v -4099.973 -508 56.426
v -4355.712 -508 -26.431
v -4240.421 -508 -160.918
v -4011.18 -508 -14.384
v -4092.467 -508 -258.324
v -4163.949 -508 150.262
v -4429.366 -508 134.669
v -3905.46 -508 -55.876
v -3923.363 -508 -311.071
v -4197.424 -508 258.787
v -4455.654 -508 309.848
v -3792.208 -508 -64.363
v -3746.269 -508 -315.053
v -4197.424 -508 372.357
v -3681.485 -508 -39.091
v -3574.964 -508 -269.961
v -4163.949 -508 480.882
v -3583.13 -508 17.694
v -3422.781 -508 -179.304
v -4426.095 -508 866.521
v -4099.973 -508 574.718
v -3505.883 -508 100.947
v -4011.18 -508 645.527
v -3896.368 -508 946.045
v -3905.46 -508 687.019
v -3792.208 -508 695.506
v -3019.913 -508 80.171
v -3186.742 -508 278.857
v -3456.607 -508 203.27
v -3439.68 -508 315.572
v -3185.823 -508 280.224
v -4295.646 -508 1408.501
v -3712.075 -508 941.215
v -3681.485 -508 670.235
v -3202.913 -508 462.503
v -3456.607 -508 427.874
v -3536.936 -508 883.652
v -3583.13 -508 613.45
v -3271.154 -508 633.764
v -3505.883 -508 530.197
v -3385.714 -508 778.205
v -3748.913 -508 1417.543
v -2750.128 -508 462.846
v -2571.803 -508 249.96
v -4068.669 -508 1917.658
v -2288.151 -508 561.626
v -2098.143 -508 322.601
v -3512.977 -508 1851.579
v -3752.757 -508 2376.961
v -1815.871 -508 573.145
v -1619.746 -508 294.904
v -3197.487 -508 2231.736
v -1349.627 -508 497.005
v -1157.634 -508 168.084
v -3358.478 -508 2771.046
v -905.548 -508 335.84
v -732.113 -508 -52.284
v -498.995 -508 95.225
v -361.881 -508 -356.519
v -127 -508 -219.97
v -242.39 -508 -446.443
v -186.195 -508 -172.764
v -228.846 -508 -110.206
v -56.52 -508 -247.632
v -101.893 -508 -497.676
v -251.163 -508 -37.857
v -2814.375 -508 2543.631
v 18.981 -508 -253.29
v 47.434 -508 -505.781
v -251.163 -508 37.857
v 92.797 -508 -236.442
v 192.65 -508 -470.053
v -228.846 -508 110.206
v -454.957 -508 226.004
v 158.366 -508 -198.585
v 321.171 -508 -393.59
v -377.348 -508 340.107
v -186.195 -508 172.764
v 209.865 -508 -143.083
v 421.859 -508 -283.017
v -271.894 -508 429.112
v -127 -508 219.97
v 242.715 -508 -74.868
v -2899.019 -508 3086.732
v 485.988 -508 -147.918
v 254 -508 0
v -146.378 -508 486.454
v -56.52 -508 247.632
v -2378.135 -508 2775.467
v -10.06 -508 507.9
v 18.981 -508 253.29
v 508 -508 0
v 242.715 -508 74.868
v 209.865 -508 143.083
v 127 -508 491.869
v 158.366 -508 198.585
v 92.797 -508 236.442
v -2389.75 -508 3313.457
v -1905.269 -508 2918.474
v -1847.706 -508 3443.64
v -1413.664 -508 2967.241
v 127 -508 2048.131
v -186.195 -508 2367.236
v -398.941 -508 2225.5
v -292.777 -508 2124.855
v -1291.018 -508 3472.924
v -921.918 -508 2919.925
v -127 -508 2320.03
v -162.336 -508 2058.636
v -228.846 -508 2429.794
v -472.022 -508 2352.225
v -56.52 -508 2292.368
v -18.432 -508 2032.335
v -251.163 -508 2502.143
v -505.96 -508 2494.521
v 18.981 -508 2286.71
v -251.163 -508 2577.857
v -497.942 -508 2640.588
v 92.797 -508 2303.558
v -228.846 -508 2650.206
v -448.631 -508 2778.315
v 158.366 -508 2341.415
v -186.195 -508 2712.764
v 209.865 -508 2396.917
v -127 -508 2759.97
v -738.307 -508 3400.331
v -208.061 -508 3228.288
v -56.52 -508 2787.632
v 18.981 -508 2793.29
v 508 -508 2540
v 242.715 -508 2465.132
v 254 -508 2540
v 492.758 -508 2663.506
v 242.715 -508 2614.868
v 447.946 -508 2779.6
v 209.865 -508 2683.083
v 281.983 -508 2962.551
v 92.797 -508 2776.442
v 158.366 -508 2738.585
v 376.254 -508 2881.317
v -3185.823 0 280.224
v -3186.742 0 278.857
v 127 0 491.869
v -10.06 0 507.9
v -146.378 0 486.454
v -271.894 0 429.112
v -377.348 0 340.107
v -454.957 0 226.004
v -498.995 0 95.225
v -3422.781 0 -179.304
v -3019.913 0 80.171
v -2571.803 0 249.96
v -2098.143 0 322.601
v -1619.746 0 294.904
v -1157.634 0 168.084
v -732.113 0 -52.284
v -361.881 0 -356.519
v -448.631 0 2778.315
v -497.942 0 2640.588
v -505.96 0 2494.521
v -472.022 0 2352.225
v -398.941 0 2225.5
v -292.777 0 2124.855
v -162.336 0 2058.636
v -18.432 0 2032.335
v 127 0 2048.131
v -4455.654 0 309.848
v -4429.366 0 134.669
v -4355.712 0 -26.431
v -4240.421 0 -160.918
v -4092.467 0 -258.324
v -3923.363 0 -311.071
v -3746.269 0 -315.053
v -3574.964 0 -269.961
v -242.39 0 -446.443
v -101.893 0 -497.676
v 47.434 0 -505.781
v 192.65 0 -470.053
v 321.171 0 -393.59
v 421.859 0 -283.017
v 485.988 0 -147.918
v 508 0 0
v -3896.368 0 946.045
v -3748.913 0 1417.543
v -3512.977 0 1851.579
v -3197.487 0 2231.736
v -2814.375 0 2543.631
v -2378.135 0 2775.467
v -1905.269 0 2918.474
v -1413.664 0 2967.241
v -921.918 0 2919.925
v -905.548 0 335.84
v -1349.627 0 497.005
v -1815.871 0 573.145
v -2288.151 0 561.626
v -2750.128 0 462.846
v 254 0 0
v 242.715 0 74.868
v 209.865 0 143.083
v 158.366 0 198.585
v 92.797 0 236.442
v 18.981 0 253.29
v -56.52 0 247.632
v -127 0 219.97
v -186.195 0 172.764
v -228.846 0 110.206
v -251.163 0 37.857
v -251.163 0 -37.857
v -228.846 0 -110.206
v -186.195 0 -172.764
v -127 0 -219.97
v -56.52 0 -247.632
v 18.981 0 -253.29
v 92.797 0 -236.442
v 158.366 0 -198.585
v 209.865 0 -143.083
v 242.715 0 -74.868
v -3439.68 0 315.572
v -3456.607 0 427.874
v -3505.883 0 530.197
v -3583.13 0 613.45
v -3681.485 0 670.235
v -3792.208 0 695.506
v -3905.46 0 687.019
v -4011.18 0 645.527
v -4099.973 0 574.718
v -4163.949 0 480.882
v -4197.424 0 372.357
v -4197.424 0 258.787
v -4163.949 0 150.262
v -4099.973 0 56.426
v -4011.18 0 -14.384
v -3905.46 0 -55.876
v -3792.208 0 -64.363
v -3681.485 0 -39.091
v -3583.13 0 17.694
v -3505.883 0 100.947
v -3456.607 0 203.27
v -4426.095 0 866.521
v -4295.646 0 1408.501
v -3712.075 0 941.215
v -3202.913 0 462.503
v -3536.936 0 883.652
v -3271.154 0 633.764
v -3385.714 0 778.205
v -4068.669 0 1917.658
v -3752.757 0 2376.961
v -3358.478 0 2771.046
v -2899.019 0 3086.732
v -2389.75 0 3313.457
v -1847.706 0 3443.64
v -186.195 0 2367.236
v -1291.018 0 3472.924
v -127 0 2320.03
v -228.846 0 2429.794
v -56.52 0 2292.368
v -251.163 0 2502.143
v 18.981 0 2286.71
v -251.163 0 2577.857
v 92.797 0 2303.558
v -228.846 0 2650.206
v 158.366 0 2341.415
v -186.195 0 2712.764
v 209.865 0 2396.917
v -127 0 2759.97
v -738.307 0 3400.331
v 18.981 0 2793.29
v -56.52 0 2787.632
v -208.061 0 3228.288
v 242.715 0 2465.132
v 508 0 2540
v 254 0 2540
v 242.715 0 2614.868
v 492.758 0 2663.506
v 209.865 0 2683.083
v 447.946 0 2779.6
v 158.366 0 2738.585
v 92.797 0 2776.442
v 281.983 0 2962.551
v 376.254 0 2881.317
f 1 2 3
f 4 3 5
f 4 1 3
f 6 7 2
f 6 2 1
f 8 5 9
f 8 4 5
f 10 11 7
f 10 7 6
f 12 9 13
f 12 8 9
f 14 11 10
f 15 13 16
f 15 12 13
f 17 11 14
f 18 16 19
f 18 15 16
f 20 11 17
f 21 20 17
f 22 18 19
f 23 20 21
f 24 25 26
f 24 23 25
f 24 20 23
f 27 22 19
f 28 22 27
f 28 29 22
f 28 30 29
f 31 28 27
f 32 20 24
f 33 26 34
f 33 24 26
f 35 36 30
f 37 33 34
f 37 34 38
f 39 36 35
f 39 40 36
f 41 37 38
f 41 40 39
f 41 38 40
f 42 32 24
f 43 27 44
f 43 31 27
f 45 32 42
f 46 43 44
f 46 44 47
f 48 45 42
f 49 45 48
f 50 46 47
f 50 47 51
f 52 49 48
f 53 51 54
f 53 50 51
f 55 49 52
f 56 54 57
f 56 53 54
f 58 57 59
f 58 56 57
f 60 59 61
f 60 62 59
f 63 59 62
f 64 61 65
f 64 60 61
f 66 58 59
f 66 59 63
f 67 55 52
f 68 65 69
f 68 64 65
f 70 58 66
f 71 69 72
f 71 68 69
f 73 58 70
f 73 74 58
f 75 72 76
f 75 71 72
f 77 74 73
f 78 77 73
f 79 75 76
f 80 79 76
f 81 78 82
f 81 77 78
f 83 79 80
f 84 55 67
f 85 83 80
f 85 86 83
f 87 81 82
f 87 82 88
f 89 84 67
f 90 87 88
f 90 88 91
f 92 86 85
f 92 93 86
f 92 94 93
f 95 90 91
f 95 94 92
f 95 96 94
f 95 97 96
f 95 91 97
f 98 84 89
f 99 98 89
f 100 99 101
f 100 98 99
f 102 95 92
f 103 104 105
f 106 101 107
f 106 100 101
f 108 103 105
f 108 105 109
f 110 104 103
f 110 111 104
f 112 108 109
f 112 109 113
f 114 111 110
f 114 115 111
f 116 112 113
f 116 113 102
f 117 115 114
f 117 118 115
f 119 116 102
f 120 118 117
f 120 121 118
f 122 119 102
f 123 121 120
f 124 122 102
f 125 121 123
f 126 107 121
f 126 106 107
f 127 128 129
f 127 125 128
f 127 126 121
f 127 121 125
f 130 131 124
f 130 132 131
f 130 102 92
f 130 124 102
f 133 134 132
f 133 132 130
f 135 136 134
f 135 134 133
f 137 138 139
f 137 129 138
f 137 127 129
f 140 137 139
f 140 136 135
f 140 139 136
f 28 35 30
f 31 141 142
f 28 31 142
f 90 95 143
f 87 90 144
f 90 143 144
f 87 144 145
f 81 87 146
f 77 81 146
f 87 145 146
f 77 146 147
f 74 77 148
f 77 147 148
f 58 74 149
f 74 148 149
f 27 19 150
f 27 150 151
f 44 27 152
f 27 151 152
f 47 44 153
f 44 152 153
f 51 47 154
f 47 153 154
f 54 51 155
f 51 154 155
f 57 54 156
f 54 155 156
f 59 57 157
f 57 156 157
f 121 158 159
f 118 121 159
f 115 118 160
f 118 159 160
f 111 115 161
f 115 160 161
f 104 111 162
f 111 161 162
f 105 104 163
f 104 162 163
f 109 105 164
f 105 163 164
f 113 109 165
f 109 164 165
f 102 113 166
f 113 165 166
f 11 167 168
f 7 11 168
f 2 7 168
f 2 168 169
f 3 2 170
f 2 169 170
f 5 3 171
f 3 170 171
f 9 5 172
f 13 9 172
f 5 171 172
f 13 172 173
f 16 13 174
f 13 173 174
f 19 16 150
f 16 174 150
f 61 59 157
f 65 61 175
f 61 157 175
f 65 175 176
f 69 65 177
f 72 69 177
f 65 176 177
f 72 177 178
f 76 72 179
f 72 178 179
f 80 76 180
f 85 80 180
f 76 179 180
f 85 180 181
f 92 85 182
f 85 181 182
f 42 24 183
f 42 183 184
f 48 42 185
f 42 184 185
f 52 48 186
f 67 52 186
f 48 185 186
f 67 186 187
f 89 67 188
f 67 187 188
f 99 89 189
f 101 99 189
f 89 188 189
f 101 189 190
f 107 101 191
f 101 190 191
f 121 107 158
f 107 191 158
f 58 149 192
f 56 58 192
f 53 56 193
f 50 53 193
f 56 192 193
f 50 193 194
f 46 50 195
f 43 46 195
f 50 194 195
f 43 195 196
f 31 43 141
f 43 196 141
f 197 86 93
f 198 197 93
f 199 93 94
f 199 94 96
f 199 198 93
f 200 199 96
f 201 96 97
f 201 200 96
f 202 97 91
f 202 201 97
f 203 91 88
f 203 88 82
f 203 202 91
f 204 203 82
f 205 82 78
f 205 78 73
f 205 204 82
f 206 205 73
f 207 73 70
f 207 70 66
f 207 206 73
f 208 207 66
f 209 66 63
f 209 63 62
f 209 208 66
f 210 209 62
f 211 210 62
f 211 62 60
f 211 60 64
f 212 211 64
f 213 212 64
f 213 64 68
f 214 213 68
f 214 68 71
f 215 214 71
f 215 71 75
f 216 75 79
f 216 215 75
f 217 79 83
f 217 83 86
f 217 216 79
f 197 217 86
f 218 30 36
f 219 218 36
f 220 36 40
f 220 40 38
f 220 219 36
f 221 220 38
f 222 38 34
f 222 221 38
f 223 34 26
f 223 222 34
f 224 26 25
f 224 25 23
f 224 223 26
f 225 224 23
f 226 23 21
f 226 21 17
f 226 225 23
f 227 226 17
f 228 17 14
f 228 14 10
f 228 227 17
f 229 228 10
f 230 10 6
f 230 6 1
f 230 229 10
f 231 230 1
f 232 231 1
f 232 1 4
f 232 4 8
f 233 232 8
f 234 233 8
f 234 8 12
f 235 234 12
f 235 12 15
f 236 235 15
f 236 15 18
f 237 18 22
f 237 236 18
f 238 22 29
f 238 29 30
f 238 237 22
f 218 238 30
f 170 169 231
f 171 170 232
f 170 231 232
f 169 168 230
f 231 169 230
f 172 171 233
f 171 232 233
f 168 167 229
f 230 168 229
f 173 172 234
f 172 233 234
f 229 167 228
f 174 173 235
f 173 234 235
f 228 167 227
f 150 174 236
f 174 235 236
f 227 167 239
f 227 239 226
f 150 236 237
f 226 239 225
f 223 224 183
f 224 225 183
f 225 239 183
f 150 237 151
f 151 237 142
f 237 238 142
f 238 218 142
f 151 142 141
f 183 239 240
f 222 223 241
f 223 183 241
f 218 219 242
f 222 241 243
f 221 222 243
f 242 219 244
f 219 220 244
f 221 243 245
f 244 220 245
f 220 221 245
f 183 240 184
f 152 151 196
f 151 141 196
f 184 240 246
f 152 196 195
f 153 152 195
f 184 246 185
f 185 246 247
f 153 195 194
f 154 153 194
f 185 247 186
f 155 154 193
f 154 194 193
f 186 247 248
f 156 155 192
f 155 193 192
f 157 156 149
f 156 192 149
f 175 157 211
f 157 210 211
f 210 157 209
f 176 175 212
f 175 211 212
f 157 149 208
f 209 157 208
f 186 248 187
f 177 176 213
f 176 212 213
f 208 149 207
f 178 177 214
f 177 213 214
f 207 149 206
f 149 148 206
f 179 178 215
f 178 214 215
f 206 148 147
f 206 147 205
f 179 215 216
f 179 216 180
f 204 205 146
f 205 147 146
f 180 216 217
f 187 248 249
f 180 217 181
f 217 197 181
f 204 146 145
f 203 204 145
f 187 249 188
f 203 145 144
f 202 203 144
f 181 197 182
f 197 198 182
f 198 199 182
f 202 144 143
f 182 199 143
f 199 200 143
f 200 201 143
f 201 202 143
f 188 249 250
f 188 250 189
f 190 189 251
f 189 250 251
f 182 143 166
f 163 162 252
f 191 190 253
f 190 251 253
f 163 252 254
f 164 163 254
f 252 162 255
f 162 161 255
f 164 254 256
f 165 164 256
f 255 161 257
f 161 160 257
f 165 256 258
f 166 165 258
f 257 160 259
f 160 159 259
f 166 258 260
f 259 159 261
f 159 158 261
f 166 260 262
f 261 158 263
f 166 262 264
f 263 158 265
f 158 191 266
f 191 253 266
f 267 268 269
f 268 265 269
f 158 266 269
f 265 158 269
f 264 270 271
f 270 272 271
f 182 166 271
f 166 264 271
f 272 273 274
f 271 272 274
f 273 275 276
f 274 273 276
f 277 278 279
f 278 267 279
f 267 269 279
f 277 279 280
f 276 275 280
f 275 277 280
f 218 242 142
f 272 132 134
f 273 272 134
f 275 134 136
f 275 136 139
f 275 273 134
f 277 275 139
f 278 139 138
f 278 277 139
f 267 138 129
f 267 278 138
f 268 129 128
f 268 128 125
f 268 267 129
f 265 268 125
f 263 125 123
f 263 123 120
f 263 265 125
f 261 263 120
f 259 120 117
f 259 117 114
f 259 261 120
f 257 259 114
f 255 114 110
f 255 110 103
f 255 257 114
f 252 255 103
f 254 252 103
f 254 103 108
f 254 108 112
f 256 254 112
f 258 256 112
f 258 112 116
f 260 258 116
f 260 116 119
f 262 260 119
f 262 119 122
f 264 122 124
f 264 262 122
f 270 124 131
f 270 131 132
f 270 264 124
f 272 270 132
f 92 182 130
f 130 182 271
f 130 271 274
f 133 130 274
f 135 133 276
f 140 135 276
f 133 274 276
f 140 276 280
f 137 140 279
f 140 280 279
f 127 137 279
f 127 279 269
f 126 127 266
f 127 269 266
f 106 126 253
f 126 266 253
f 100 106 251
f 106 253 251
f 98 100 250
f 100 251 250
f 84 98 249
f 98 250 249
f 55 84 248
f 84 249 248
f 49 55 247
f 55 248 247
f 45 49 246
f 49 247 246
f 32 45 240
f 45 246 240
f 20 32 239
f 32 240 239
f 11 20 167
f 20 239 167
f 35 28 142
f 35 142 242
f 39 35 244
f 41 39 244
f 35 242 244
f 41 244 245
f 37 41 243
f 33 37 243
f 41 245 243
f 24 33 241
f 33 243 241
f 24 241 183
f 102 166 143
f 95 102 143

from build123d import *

# Parameters (mm, degrees)
F0_R     = 381
F0_R_2   = 254
F1_DEPTH = 508


with BuildPart() as f1:
    # F0 (on Front) → F1 (new body)
    with BuildSketch(Plane.XZ):
        with BuildLine():
            ThreePointArc((508, 2459.000759), (505.168538, 2461.669846), (502.333361, 2464.334987))
            ThreePointArc((502.333361, 2464.334987), (506.581359, 2502.061546), (508, 2540))
            ThreePointArc((508, 2540), (447.946112, 2779.600253), (281.983145, 2962.551187))
            ThreePointArc((281.983145, 2962.551187), (-2899.019317, 3086.731703), (-4455.65407, 309.84753))
            ThreePointArc((-4455.65407, 309.84753), (-4092.46741, -258.324114), (-3422.781404, -179.303737))
            ThreePointArc((-3422.781404, -179.303737), (-1858.216728, 321.322545), (-361.881258, -356.519221))
            ThreePointArc((-361.881258, -356.519221), (192.650358, -470.053018), (508, 0))
            Line((508, 0), (508, 2459.000759))
        make_face()
        with Locations((-3820.679872, 315.571813)):
            Circle(F0_R, mode=Mode.SUBTRACT)
        Circle(F0_R_2, mode=Mode.SUBTRACT)
        with BuildLine():
            Line((127, 2048.131115), (127, 491.868885))
            ThreePointArc((127, 491.868885), (-271.894452, 429.112348), (-498.995104, 95.22545))
            ThreePointArc((-498.995104, 95.22545), (-1815.871262, 573.144728), (-3185.822725, 280.223846))
            Line((-3185.822725, 280.223846), (-3186.742158, 278.857028))
            ThreePointArc((-3186.742158, 278.857028), (-3385.71377, 778.205026), (-3896.368164, 946.044875))
            ThreePointArc((-3896.368164, 946.044875), (-2601.904622, 2670.180193), (-448.631437, 2778.314568))
            ThreePointArc((-448.631437, 2778.314568), (-398.940678, 2225.499864), (127, 2048.131115))
        make_face(mode=Mode.SUBTRACT)
        with Locations((0, 2540)):
            Circle(F0_R_2, mode=Mode.SUBTRACT)
        with BuildLine():
            ThreePointArc((508, 2540), (506.581359, 2502.061546), (502.333361, 2464.334987))
            ThreePointArc((502.333361, 2464.334987), (505.168538, 2461.669846), (508, 2459.000759))
            Line((508, 2459.000759), (508, 2540))
        make_face()
    extrude(amount=F1_DEPTH)


solid = f1.part
